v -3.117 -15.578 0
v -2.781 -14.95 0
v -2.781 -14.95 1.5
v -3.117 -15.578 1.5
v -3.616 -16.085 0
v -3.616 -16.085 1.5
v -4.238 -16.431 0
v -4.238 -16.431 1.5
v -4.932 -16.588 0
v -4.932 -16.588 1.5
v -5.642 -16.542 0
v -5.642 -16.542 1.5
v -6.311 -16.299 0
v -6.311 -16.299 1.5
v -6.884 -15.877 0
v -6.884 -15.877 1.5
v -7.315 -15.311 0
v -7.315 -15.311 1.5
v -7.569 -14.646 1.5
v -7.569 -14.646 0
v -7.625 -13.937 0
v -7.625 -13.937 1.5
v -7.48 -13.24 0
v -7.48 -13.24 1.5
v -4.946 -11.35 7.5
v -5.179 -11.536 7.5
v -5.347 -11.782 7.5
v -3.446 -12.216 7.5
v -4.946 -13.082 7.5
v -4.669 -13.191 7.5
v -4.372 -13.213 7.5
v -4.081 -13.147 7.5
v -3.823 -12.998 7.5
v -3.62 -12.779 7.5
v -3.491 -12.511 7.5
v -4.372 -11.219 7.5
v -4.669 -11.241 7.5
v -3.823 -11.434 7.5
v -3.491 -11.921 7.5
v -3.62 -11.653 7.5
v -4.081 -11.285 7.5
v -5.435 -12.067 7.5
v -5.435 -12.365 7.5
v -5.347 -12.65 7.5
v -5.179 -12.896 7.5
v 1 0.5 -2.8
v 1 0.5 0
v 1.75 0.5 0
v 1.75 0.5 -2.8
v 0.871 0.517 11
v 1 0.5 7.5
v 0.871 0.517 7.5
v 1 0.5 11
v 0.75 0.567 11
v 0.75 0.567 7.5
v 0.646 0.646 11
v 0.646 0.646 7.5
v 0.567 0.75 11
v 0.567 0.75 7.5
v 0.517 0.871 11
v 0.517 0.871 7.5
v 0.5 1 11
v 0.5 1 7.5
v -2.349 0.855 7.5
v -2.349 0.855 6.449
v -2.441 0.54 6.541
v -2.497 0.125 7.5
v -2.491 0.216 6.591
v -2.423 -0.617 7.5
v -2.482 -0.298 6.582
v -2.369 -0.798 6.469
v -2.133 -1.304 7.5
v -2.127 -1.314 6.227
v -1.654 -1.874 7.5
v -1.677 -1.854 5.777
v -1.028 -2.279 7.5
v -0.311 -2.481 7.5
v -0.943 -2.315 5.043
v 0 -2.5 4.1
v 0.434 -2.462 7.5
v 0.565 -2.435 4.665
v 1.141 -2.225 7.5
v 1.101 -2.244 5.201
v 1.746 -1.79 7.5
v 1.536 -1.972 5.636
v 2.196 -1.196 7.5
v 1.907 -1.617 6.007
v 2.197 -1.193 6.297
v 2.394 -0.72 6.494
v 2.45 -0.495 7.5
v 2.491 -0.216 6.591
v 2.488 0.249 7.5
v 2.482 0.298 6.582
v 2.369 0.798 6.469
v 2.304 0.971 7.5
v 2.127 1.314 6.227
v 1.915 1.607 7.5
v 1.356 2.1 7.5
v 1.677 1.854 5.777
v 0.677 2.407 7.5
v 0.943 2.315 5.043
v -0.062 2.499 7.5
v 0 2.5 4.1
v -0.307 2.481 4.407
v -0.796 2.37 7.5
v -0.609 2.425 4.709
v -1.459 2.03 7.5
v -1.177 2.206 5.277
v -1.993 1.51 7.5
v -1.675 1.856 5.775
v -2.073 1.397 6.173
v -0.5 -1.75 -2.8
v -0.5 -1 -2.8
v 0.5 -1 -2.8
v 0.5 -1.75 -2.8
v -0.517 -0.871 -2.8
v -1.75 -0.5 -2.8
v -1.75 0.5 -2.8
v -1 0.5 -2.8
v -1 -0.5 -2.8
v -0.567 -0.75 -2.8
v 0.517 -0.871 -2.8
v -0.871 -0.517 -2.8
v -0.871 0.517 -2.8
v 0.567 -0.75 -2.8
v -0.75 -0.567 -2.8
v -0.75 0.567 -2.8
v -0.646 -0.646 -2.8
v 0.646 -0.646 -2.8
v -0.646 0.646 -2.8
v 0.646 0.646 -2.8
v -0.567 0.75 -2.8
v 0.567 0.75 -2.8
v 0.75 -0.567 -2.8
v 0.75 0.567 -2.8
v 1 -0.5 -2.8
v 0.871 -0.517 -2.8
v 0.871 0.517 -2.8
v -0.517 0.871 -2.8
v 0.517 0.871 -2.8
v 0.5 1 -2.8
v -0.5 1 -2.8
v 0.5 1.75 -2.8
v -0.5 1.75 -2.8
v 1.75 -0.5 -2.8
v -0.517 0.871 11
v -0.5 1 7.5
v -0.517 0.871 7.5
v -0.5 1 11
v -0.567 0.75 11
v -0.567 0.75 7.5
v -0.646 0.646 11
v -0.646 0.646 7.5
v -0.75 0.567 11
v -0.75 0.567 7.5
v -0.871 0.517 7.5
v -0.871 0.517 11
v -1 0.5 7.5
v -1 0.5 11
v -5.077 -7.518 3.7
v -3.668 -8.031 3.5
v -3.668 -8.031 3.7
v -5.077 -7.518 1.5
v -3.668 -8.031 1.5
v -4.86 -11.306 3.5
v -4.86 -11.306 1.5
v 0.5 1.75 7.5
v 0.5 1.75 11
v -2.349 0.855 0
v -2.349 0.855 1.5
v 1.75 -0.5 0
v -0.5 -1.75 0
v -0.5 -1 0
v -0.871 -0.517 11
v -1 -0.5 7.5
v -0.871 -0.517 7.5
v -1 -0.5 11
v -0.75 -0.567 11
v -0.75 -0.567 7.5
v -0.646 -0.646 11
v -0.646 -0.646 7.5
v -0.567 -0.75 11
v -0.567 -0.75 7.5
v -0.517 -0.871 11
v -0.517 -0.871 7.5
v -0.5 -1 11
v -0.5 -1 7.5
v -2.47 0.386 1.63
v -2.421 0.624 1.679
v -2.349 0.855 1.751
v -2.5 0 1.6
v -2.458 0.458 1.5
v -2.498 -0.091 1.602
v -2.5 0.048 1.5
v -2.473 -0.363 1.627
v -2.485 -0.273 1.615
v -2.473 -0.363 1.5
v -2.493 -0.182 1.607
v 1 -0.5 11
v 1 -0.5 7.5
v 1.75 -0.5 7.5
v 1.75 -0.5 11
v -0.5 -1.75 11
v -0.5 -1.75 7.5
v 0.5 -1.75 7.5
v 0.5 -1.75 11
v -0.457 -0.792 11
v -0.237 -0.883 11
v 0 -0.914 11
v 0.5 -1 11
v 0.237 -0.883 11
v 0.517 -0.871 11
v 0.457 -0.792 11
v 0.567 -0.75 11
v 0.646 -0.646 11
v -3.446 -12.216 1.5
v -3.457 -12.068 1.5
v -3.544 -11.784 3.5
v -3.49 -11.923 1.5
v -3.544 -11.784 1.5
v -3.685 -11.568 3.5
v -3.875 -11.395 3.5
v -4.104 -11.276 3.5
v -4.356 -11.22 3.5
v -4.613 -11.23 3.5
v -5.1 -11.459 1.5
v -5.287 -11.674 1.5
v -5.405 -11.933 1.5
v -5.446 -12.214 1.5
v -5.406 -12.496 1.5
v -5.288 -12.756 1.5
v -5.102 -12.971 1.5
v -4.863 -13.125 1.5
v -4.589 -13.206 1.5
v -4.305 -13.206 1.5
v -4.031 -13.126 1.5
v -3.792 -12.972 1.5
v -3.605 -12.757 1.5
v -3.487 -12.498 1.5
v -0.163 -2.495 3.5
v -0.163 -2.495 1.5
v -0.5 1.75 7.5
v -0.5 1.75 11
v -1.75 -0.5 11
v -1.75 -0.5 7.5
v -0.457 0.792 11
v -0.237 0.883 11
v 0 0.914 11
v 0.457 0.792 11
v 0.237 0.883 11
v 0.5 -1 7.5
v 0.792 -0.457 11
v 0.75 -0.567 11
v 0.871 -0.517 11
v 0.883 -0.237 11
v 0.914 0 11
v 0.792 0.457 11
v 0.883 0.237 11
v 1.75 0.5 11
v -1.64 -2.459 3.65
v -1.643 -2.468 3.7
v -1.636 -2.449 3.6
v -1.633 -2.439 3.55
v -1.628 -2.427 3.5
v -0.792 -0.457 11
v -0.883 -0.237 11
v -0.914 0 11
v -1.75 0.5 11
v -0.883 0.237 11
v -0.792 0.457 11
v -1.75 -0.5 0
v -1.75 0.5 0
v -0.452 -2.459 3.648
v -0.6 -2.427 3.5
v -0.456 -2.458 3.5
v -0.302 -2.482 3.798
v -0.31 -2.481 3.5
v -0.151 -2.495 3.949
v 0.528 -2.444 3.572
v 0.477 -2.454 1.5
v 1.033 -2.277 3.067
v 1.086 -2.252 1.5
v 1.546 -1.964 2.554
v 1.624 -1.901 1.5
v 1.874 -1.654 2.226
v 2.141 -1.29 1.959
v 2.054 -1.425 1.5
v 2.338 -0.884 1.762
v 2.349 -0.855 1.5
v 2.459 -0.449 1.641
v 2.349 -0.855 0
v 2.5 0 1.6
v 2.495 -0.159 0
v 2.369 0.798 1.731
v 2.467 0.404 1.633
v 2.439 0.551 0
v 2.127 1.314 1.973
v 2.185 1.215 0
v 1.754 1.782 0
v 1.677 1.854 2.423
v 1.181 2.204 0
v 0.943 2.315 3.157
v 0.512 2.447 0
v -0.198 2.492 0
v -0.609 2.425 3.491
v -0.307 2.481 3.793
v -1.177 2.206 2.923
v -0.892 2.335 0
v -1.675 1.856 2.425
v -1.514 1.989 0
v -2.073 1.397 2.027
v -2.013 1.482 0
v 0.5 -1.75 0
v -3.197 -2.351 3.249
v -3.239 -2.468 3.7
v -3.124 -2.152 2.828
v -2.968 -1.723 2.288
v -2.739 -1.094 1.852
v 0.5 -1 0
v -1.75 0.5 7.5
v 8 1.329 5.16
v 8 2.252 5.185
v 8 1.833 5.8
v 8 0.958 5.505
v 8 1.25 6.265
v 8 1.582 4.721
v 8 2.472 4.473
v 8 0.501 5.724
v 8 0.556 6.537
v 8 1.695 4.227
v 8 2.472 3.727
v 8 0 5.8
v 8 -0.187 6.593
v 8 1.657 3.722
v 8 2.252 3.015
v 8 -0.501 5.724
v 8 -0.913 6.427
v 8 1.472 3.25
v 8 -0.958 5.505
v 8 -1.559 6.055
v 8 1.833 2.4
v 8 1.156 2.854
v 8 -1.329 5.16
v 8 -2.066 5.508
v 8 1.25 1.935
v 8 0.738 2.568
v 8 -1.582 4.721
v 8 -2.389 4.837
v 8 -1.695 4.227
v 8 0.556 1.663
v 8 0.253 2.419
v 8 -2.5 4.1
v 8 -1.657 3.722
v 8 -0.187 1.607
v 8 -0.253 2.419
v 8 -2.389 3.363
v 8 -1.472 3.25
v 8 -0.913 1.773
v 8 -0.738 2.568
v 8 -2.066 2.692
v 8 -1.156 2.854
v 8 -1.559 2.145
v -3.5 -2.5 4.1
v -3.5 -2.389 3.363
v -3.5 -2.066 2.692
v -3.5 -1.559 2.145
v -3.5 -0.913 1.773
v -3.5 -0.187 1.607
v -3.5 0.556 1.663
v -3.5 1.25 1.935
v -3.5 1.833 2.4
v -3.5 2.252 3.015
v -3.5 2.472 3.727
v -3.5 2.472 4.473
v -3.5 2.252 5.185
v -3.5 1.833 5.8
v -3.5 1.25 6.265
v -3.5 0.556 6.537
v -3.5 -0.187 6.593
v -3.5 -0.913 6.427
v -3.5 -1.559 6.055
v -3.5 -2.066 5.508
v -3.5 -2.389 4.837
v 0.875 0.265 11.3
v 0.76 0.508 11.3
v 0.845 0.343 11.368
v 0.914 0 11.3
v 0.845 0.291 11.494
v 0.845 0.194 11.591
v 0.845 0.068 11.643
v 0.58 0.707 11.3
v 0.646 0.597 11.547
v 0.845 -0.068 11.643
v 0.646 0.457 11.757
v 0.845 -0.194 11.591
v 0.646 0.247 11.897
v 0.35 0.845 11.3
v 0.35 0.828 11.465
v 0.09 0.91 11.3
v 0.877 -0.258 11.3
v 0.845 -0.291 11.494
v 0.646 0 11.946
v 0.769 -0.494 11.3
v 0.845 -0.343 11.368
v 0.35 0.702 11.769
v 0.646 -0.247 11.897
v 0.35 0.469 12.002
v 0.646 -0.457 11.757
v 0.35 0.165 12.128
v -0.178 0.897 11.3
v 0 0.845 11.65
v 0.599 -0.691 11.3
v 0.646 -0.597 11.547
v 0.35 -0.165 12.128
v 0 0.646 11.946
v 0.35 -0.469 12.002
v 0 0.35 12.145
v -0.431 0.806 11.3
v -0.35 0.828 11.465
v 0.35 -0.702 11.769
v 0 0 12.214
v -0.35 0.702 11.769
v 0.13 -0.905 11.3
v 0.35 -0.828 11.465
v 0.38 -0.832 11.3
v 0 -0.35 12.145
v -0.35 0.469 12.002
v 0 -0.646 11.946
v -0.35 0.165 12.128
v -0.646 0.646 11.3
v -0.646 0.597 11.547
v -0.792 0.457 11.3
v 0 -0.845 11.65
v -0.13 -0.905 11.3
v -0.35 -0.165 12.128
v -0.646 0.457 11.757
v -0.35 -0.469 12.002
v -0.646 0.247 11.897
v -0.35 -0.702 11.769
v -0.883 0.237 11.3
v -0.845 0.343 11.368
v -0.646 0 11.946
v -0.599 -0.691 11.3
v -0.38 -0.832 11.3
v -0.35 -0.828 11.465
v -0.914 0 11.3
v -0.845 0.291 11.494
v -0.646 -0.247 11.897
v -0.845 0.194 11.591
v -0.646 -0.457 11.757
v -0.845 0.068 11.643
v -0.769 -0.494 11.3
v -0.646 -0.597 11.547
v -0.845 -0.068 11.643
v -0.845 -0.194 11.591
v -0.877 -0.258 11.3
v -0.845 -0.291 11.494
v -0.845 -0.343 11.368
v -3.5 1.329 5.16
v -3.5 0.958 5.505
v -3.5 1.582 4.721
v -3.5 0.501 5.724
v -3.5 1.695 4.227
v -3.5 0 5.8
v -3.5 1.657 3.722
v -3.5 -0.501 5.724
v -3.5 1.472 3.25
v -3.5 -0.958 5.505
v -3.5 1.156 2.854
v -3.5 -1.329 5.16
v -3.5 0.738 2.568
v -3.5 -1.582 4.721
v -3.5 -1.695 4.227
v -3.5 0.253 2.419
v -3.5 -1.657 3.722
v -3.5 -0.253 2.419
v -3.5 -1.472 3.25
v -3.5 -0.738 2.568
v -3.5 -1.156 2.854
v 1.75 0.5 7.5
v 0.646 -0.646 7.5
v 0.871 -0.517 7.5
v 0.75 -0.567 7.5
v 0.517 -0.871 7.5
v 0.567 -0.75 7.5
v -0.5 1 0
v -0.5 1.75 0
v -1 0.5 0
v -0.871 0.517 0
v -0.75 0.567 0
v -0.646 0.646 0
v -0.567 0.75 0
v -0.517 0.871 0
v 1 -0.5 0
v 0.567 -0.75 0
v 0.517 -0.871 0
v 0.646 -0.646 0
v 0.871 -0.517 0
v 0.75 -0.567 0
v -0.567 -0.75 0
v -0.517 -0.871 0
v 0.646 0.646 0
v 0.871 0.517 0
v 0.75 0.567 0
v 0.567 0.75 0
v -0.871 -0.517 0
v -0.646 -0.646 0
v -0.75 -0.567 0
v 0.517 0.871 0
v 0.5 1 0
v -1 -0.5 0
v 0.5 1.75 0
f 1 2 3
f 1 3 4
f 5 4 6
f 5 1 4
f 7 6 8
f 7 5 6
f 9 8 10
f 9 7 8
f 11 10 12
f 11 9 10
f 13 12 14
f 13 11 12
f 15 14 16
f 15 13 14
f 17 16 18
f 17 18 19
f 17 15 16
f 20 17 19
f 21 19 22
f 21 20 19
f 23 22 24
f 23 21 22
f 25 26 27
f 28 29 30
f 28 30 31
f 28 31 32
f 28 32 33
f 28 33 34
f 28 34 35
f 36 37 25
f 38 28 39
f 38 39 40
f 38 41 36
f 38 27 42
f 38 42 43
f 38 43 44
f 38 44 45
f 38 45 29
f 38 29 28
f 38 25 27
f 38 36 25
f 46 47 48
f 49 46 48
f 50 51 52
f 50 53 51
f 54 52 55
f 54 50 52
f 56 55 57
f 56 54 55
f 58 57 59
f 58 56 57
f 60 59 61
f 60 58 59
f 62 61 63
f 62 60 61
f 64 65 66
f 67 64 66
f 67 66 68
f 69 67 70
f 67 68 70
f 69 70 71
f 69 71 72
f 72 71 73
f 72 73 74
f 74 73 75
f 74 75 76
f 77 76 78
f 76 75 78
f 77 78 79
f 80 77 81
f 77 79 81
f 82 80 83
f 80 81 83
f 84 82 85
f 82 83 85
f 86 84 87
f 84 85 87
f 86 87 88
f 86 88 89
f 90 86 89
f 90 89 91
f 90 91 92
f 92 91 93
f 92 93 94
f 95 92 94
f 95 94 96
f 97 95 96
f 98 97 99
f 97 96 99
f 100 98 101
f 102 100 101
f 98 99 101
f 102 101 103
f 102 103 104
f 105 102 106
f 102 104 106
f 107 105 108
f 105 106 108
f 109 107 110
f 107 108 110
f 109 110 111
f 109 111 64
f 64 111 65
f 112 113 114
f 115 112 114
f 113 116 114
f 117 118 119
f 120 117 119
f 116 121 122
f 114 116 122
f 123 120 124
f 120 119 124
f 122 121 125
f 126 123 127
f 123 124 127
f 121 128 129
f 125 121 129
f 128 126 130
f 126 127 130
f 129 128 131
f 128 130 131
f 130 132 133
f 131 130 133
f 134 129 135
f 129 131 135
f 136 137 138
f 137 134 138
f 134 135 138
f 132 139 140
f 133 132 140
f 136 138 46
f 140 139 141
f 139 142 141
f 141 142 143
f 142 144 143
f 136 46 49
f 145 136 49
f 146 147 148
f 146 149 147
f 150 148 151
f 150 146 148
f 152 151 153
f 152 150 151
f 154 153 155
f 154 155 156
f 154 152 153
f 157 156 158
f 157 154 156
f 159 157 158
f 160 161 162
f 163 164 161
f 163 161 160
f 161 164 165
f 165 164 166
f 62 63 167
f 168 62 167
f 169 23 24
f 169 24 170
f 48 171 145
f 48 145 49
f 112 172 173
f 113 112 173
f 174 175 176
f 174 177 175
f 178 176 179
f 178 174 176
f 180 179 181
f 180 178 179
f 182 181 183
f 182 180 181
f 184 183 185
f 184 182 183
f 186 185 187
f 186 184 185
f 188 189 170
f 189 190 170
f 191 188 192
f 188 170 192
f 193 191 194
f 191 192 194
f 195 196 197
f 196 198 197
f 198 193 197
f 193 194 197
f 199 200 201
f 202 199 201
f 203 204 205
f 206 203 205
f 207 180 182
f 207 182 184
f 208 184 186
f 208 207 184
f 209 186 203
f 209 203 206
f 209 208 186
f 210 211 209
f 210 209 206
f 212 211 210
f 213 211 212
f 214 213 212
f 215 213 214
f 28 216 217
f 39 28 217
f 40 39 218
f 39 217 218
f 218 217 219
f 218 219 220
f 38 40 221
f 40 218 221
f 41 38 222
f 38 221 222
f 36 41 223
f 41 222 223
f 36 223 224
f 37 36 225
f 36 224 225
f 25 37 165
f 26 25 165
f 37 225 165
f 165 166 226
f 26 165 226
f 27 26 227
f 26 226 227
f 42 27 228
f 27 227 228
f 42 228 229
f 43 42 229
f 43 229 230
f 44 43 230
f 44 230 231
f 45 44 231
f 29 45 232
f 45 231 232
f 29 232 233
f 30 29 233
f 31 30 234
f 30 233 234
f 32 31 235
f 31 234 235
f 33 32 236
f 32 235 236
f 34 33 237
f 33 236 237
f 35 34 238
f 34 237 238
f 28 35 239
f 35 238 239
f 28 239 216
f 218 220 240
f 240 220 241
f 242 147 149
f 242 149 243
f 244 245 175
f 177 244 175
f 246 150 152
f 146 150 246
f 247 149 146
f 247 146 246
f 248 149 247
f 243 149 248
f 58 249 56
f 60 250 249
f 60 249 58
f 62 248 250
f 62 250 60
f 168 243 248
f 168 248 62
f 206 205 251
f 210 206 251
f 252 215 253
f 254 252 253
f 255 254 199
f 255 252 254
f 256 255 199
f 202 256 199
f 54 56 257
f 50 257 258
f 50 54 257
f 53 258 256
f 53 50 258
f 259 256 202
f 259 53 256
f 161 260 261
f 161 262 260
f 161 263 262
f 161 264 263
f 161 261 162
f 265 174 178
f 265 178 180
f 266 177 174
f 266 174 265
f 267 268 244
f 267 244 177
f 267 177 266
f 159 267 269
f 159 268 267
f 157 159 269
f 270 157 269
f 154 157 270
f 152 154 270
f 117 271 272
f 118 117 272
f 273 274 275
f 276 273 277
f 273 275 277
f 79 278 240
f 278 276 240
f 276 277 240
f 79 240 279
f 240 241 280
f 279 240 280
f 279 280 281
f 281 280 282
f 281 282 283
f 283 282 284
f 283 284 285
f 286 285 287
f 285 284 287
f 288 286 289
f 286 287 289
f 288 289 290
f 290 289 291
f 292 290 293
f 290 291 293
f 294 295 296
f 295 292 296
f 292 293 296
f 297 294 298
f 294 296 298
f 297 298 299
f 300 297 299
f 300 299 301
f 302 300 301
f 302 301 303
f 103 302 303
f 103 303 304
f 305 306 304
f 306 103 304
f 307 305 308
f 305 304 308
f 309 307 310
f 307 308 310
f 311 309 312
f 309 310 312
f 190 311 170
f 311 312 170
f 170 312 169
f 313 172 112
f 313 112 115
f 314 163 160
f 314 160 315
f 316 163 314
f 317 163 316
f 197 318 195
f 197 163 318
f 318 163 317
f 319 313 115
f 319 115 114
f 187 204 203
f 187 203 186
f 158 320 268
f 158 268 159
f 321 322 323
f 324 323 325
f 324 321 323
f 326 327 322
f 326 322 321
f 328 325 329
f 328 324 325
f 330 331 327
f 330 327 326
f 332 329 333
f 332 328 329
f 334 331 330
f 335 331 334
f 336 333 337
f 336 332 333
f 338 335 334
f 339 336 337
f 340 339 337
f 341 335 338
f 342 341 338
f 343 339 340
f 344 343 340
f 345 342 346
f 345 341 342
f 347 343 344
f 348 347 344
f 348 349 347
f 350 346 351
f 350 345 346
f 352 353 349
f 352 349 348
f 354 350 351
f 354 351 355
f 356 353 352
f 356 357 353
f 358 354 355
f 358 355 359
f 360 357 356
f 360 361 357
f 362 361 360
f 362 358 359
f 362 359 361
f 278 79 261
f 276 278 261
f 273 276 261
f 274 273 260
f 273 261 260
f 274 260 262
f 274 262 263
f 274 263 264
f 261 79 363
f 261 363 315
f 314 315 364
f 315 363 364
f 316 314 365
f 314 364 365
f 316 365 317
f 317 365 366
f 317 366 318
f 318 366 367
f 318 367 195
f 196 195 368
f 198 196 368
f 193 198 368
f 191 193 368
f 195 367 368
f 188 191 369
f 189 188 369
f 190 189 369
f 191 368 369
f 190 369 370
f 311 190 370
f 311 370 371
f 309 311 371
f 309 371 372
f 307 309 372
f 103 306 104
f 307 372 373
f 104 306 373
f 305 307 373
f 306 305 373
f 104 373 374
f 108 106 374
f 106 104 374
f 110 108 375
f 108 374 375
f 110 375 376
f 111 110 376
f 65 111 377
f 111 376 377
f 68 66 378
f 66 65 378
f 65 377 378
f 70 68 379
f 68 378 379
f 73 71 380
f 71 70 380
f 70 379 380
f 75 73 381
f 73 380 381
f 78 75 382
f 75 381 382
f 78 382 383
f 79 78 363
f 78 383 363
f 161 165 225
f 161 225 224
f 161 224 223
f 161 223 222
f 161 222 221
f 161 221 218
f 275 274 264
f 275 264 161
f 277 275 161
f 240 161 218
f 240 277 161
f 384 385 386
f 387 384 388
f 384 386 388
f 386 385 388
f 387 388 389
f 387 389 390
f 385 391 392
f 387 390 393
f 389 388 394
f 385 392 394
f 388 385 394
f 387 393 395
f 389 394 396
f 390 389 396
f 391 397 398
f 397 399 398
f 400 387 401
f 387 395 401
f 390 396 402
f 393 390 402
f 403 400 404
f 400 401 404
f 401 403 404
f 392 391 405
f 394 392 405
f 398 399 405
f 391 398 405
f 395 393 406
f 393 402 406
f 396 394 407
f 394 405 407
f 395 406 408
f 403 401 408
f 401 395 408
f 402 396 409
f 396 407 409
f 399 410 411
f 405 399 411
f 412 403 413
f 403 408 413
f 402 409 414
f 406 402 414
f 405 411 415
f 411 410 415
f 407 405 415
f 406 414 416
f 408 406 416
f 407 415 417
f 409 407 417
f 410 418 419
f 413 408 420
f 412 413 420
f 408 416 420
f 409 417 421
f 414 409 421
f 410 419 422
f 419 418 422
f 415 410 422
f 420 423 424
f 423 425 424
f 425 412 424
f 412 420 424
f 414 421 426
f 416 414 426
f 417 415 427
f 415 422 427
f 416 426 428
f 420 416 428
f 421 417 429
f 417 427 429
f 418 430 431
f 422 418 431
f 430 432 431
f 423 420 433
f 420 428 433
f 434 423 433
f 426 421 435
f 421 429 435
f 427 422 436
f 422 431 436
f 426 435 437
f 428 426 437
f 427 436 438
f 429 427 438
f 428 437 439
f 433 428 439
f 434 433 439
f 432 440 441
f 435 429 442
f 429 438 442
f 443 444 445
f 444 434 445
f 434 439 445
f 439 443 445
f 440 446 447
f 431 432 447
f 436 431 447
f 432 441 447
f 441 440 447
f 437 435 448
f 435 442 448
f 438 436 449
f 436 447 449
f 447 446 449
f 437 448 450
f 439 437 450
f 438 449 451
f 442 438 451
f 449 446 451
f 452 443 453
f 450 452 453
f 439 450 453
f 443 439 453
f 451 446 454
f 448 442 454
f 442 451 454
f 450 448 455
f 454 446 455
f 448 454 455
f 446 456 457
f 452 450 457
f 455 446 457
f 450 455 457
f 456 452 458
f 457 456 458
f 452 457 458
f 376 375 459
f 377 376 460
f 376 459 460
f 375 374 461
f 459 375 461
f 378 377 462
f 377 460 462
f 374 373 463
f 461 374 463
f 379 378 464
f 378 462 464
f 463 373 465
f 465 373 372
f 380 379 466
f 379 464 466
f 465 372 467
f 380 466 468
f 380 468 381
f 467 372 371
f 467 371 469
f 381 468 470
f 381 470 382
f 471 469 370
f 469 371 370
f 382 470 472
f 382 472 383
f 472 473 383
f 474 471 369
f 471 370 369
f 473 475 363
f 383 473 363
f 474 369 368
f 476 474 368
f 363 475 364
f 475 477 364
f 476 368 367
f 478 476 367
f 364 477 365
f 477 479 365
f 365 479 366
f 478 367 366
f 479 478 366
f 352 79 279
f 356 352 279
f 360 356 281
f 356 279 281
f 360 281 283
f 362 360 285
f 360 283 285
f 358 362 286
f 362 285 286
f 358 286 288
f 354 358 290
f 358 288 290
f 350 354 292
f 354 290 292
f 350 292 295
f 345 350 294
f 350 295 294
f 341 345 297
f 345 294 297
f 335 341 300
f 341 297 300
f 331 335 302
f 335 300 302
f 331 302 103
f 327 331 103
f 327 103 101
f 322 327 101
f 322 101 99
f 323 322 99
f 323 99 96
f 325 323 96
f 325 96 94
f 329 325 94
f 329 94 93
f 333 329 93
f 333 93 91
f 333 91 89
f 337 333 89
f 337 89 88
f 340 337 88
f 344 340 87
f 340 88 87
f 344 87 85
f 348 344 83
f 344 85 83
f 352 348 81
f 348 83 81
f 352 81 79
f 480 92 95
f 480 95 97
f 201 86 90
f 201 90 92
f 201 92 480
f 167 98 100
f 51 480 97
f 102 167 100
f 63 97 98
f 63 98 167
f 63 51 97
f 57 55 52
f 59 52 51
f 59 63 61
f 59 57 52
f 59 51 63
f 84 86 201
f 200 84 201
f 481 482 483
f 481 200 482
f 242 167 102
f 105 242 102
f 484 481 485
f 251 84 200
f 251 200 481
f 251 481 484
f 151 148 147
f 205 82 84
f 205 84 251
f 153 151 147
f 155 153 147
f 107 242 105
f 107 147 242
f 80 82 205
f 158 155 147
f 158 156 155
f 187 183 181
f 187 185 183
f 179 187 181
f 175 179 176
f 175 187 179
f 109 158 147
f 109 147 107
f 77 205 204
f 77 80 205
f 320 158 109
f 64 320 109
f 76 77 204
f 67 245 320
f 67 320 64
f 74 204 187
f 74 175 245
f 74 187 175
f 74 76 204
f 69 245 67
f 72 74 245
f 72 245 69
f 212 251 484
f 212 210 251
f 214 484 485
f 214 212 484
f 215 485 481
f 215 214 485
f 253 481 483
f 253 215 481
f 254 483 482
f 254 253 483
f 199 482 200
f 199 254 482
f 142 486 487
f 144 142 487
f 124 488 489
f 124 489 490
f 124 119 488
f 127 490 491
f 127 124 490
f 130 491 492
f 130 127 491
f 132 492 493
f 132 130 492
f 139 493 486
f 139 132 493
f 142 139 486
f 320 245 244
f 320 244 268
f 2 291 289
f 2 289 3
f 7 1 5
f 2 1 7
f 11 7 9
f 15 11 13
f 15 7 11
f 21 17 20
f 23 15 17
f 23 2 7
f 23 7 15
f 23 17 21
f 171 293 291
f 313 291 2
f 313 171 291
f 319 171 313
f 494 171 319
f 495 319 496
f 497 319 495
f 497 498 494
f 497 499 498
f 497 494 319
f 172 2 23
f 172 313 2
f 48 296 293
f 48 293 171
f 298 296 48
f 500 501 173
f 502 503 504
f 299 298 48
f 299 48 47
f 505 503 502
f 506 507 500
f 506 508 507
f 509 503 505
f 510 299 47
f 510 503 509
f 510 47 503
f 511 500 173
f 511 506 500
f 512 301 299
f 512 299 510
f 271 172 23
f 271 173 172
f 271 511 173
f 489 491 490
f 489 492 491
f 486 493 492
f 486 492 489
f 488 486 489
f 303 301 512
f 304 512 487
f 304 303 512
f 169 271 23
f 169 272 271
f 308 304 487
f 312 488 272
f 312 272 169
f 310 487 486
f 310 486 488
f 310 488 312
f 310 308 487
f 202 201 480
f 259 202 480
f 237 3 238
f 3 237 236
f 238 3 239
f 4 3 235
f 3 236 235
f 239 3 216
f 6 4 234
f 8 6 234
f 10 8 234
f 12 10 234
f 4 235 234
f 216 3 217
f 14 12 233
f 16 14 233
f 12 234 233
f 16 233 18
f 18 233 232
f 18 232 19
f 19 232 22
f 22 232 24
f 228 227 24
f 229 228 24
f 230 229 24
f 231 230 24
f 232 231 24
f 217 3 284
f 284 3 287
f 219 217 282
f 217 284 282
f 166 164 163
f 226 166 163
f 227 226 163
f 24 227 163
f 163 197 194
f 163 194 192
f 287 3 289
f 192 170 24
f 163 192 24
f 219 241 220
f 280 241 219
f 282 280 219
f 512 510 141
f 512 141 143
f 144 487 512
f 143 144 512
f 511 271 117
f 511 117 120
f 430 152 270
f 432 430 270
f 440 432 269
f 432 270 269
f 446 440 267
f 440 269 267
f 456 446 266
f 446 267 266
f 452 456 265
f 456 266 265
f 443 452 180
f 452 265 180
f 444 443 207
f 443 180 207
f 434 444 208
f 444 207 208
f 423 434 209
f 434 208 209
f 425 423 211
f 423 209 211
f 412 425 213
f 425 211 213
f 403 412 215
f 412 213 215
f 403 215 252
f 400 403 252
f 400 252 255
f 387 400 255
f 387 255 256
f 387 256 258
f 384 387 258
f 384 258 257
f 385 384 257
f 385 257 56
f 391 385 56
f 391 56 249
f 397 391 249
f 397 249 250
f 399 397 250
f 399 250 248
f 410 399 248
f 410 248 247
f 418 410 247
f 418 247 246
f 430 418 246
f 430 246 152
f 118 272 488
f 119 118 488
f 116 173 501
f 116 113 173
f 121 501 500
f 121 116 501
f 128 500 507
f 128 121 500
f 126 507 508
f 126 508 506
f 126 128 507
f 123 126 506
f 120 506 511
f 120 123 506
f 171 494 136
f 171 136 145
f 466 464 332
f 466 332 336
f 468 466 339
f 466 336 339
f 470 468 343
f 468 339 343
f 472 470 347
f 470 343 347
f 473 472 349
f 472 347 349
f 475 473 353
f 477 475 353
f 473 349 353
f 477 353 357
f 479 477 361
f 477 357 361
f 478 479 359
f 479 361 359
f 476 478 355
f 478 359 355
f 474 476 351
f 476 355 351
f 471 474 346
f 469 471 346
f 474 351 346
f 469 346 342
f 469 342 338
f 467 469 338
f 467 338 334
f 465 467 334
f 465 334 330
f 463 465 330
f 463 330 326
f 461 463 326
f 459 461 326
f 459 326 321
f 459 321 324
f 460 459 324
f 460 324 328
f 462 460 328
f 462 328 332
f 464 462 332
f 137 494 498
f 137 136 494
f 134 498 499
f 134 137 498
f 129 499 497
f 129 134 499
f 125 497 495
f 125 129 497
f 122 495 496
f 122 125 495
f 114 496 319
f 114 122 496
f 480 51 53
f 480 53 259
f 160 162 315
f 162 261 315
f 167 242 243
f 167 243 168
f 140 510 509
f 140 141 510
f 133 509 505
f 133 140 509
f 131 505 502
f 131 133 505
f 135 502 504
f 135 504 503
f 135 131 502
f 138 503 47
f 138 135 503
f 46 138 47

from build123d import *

# Parameters (mm, degrees)
ESTRUSIONE_ESTRUSIONE1_DEPTH  = 1.5
SCHIZZO2_R                    = 2.5
ESTRUSIONE_ESTRUSIONE2_DEPTH  = 7.5
SCHIZZO3_R                    = 1
ESTRUSIONE_ESTRUSIONE3_DEPTH  = 6
SCHIZZO4_R                    = 2.5
ESTRUSIONE_ESTRUSIONE8_DEPTH  = 8
ESTRUSIONE_ESTRUSIONE16_START = -3.5
SCHIZZO5_R                    = 2.5
ESTRUSIONE_ESTRUSIONE16_DEPTH = 3.5
SCHIZZO7_W                    = 1
SCHIZZO7_H                    = 3.5
SCHIZZO7_W_2                  = 3.5
SCHIZZO7_H_2                  = 1
ESTRUSIONE_SOTTILE1_DEPTH     = 3.5
RACCORDO1_R                   = 0.5
RACCORDO1_OF_SPECCHIA6_R      = 0.5
SCHIZZO10_R                   = 0.914213562
ESTRUSIONE_ESTRUSIONE17_DEPTH = 0.3
ESTRUSIONE_ESTRUSIONE18_DEPTH = 2.2
ESTRUSIONE_ESTRUSIONE19_DEPTH = 2
FORO_PER_VITE_M3_1_D          = 3.4


with BuildPart() as part:
    # Schizzo1 → Estrusione-Estrusione1 (new body)
    with BuildSketch(Plane.XY):
        with BuildLine():
            Line((2.349231552, -0.855050358), (-2.781070598, -14.95043967))
            ThreePointArc((-2.781070598, -14.95043967), (-5.985352508, -16.444620864), (-7.479533702, -13.240338953))
            Line((-7.479533702, -13.240338953), (-2.349231552, 0.855050358))
            ThreePointArc((-2.349231552, 0.855050358), (0.855050358, 2.349231552), (2.349231552, -0.855050358))
        make_face()
    extrude(amount=ESTRUSIONE_ESTRUSIONE1_DEPTH)

    # Schizzo2 → Estrusione-Estrusione2 (add)
    with BuildSketch(Plane.XY):
        with Locations(Location((0, 0, 0), (0, 0, 160))):
            Circle(SCHIZZO2_R)
    extrude(amount=ESTRUSIONE_ESTRUSIONE2_DEPTH)

    # Schizzo3 → Estrusione-Estrusione3 (add)
    with BuildSketch(Plane.XY.offset(1.5)):
        with Locations((-4.446261863, -12.21600407)):
            Circle(SCHIZZO3_R)
    extrude(amount=ESTRUSIONE_ESTRUSIONE3_DEPTH)

    # Schizzo4 → Estrusione-Estrusione8 (add)
    with BuildSketch(Plane(origin=(0, 0, 0), x_dir=(0, 0, -1), z_dir=(1, 0, 0))):
        with Locations(Location((-4.1, 0, 0), (0, 0, 270))):
            Circle(SCHIZZO4_R)
    extrude(amount=ESTRUSIONE_ESTRUSIONE8_DEPTH)

    # Schizzo5 → Estrusione-Estrusione16 (add)
    with BuildSketch(Plane(origin=(0, 0, 0), x_dir=(0, 0, -1), z_dir=(1, 0, 0)).offset(ESTRUSIONE_ESTRUSIONE16_START)):
        with Locations(Location((-4.1, 0, 0), (0, 0, 270))):
            Circle(SCHIZZO5_R)
    extrude(amount=ESTRUSIONE_ESTRUSIONE16_DEPTH)

    # Schizzo7 → Estrusione-Sottile1 (add)
    with BuildSketch(Plane.XY.offset(7.5)):
        Rectangle(SCHIZZO7_W, SCHIZZO7_H)
        Rectangle(SCHIZZO7_W_2, SCHIZZO7_H_2)
    estrusione_sottile1 = extrude(amount=ESTRUSIONE_SOTTILE1_DEPTH)

    # Raccordo1
    raccordo1_edges = [part.edges().sort_by_distance(p)[0] for p in [
        (-0.5, 0.5, 9.25),
        (0.5, -0.5, 9.25),
        (-0.5, -0.5, 9.25),
        (0.5, 0.5, 9.25),
    ]]
    fillet(raccordo1_edges, radius=RACCORDO1_R)

    # Specchia6: Estrusione-Sottile1 across plane
    add(estrusione_sottile1.mirror(Plane.XY.offset(4.1)))

    # Raccordo1 of Specchia6
    raccordo1_of_specchia6_edges = [part.edges().sort_by_distance(p)[0] for p in [
        (-0.5, 0.5, -1.05),
        (0.5, -0.5, -1.05),
        (-0.5, -0.5, -1.05),
        (0.5, 0.5, -1.05),
    ]]
    fillet(raccordo1_of_specchia6_edges, radius=RACCORDO1_OF_SPECCHIA6_R)

    # Schizzo10 → Estrusione-Estrusione17 (add)
    with BuildSketch(Plane.XY.offset(11)):
        with Locations(Location((0, 0, 0), (0, 0, 135))):
            Circle(SCHIZZO10_R)
    extrude(amount=ESTRUSIONE_ESTRUSIONE17_DEPTH)

    # Schizzo11 → Rivoluzione2 (revolve)
    with BuildSketch(Plane.XY.offset(11.3)):
        with BuildLine():
            Line((-0.914213562, 0), (0.914213562, 0))
            ThreePointArc((0.914213562, 0), (0, 0.914213562), (-0.914213562, 0))
        make_face()
    revolve(axis=Axis((-0.914213562, 0, 11.3), (1, 0, 0)))

    # Schizzo12 → Estrusione-Estrusione18 (add)
    with BuildSketch(Plane.XY.offset(1.5)):
        Polygon((-5.077352246, -7.517540966), (-2.341191099, 0), (-0.931652168, -0.513030215), (-3.667813315, -8.030571181), align=None)
    extrude(amount=ESTRUSIONE_ESTRUSIONE18_DEPTH)

    # Schizzo13 → Estrusione-Estrusione19 (add)
    with BuildSketch(Plane.XY.offset(1.5)):
        Polygon((-3.788477029, -12.455418171), (0.744924441, 0), (-0.744924441, 0), (-5.104046698, -11.97658997), align=None)
    extrude(amount=ESTRUSIONE_ESTRUSIONE19_DEPTH)

    # Foro per Vite M3-1 (through all)
    with Locations(Plane(origin=(-3.5, 0, 4.1), x_dir=(0, 0, -1), z_dir=(-1, 0, 0))):
        with Locations((0, 0)):
            Hole(FORO_PER_VITE_M3_1_D / 2)


solid = part.part
